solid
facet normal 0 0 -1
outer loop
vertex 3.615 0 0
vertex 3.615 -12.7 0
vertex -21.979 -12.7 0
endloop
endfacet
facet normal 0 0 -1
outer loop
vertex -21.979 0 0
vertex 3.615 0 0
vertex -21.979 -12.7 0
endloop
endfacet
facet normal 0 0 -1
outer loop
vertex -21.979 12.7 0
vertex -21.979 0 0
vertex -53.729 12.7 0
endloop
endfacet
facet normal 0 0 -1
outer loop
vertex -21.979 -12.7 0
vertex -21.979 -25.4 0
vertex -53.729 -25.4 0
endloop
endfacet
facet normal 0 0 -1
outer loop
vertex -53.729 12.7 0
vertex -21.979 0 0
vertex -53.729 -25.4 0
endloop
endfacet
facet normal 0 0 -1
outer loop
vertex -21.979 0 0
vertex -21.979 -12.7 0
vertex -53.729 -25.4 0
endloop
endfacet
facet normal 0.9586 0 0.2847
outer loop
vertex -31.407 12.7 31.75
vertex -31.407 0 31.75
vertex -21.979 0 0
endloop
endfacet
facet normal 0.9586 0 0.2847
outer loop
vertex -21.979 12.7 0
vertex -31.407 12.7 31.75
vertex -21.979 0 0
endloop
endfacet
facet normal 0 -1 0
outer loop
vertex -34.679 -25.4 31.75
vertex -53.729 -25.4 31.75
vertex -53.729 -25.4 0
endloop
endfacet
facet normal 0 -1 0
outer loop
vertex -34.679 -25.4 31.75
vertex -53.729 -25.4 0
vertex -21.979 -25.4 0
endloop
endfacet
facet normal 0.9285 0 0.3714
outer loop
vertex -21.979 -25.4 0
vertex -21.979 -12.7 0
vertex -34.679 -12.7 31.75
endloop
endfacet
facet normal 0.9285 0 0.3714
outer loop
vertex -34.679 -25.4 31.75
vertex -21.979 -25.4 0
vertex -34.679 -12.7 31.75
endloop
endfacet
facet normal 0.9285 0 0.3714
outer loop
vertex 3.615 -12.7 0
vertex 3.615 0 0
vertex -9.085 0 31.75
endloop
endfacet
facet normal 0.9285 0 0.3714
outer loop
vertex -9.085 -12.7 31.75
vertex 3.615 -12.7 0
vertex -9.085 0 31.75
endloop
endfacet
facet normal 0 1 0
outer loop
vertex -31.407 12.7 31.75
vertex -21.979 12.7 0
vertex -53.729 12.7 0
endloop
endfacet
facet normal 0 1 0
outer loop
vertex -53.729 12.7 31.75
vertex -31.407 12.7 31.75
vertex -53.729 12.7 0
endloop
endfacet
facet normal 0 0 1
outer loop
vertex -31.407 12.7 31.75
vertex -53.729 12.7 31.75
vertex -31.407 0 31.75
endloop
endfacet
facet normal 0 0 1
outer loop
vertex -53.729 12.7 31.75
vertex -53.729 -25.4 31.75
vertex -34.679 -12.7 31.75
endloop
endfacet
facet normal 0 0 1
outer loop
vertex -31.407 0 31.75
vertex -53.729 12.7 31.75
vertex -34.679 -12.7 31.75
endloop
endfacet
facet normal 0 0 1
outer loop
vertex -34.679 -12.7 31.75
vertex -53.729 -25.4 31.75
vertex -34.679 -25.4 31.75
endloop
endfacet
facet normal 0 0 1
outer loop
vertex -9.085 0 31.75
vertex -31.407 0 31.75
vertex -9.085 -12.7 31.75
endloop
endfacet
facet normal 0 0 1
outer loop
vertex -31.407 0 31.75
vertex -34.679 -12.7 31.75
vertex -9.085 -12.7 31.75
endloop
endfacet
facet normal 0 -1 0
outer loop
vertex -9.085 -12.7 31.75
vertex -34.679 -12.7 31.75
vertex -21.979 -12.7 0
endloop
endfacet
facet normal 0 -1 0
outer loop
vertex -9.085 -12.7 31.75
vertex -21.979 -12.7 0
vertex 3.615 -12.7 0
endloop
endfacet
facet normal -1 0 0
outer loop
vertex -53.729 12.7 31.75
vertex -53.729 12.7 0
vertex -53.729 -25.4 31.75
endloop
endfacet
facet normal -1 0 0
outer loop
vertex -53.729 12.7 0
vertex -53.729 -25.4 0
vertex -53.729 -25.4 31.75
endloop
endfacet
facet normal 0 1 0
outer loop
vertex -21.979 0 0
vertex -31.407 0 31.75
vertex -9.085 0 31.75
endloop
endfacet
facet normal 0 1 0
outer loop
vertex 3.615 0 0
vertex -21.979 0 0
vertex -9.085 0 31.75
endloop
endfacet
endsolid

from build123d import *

# Parameters (mm, degrees)
F1_DEPTH = 12.7
F3_DEPTH = 12.7
F5_DEPTH = 25.4
F7_DEPTH = 12.7


with BuildPart() as f1:
    # F0 (on Front) → F1 (new body)
    with BuildSketch(Plane.XZ):
        Polygon((-53.534672, 31.75), (-53.534672, 0), (3.615328, 0), (-9.084672, 31.75), align=None)
    extrude(amount=F1_DEPTH)

    # F2 (on Front) → F3 (join)
    with BuildSketch(Plane.XZ):
        Polygon((-53.729344, 31.75), (-53.729344, 0), (-21.979344, 0), (-34.679344, 31.75), align=None)
    extrude(amount=F3_DEPTH)

    # F4 (on Front) → F5 (join)
    with BuildSketch(Plane.XZ):
        Polygon((-53.729344, 31.75), (-53.729344, 0), (-21.979344, 0), (-34.679344, 31.75), align=None)
    extrude(amount=F5_DEPTH)

    # F6 (on face) → F7 (join)
    with BuildSketch(Plane(origin=(0, 0, 0), x_dir=(-1, 0, 0), z_dir=(0, 1, 0))):
        Polygon((21.979344, 0), (53.729344, 0), (53.729344, 31.75), (31.407008, 31.75), align=None)
    extrude(amount=F7_DEPTH)


solid = f1.part
